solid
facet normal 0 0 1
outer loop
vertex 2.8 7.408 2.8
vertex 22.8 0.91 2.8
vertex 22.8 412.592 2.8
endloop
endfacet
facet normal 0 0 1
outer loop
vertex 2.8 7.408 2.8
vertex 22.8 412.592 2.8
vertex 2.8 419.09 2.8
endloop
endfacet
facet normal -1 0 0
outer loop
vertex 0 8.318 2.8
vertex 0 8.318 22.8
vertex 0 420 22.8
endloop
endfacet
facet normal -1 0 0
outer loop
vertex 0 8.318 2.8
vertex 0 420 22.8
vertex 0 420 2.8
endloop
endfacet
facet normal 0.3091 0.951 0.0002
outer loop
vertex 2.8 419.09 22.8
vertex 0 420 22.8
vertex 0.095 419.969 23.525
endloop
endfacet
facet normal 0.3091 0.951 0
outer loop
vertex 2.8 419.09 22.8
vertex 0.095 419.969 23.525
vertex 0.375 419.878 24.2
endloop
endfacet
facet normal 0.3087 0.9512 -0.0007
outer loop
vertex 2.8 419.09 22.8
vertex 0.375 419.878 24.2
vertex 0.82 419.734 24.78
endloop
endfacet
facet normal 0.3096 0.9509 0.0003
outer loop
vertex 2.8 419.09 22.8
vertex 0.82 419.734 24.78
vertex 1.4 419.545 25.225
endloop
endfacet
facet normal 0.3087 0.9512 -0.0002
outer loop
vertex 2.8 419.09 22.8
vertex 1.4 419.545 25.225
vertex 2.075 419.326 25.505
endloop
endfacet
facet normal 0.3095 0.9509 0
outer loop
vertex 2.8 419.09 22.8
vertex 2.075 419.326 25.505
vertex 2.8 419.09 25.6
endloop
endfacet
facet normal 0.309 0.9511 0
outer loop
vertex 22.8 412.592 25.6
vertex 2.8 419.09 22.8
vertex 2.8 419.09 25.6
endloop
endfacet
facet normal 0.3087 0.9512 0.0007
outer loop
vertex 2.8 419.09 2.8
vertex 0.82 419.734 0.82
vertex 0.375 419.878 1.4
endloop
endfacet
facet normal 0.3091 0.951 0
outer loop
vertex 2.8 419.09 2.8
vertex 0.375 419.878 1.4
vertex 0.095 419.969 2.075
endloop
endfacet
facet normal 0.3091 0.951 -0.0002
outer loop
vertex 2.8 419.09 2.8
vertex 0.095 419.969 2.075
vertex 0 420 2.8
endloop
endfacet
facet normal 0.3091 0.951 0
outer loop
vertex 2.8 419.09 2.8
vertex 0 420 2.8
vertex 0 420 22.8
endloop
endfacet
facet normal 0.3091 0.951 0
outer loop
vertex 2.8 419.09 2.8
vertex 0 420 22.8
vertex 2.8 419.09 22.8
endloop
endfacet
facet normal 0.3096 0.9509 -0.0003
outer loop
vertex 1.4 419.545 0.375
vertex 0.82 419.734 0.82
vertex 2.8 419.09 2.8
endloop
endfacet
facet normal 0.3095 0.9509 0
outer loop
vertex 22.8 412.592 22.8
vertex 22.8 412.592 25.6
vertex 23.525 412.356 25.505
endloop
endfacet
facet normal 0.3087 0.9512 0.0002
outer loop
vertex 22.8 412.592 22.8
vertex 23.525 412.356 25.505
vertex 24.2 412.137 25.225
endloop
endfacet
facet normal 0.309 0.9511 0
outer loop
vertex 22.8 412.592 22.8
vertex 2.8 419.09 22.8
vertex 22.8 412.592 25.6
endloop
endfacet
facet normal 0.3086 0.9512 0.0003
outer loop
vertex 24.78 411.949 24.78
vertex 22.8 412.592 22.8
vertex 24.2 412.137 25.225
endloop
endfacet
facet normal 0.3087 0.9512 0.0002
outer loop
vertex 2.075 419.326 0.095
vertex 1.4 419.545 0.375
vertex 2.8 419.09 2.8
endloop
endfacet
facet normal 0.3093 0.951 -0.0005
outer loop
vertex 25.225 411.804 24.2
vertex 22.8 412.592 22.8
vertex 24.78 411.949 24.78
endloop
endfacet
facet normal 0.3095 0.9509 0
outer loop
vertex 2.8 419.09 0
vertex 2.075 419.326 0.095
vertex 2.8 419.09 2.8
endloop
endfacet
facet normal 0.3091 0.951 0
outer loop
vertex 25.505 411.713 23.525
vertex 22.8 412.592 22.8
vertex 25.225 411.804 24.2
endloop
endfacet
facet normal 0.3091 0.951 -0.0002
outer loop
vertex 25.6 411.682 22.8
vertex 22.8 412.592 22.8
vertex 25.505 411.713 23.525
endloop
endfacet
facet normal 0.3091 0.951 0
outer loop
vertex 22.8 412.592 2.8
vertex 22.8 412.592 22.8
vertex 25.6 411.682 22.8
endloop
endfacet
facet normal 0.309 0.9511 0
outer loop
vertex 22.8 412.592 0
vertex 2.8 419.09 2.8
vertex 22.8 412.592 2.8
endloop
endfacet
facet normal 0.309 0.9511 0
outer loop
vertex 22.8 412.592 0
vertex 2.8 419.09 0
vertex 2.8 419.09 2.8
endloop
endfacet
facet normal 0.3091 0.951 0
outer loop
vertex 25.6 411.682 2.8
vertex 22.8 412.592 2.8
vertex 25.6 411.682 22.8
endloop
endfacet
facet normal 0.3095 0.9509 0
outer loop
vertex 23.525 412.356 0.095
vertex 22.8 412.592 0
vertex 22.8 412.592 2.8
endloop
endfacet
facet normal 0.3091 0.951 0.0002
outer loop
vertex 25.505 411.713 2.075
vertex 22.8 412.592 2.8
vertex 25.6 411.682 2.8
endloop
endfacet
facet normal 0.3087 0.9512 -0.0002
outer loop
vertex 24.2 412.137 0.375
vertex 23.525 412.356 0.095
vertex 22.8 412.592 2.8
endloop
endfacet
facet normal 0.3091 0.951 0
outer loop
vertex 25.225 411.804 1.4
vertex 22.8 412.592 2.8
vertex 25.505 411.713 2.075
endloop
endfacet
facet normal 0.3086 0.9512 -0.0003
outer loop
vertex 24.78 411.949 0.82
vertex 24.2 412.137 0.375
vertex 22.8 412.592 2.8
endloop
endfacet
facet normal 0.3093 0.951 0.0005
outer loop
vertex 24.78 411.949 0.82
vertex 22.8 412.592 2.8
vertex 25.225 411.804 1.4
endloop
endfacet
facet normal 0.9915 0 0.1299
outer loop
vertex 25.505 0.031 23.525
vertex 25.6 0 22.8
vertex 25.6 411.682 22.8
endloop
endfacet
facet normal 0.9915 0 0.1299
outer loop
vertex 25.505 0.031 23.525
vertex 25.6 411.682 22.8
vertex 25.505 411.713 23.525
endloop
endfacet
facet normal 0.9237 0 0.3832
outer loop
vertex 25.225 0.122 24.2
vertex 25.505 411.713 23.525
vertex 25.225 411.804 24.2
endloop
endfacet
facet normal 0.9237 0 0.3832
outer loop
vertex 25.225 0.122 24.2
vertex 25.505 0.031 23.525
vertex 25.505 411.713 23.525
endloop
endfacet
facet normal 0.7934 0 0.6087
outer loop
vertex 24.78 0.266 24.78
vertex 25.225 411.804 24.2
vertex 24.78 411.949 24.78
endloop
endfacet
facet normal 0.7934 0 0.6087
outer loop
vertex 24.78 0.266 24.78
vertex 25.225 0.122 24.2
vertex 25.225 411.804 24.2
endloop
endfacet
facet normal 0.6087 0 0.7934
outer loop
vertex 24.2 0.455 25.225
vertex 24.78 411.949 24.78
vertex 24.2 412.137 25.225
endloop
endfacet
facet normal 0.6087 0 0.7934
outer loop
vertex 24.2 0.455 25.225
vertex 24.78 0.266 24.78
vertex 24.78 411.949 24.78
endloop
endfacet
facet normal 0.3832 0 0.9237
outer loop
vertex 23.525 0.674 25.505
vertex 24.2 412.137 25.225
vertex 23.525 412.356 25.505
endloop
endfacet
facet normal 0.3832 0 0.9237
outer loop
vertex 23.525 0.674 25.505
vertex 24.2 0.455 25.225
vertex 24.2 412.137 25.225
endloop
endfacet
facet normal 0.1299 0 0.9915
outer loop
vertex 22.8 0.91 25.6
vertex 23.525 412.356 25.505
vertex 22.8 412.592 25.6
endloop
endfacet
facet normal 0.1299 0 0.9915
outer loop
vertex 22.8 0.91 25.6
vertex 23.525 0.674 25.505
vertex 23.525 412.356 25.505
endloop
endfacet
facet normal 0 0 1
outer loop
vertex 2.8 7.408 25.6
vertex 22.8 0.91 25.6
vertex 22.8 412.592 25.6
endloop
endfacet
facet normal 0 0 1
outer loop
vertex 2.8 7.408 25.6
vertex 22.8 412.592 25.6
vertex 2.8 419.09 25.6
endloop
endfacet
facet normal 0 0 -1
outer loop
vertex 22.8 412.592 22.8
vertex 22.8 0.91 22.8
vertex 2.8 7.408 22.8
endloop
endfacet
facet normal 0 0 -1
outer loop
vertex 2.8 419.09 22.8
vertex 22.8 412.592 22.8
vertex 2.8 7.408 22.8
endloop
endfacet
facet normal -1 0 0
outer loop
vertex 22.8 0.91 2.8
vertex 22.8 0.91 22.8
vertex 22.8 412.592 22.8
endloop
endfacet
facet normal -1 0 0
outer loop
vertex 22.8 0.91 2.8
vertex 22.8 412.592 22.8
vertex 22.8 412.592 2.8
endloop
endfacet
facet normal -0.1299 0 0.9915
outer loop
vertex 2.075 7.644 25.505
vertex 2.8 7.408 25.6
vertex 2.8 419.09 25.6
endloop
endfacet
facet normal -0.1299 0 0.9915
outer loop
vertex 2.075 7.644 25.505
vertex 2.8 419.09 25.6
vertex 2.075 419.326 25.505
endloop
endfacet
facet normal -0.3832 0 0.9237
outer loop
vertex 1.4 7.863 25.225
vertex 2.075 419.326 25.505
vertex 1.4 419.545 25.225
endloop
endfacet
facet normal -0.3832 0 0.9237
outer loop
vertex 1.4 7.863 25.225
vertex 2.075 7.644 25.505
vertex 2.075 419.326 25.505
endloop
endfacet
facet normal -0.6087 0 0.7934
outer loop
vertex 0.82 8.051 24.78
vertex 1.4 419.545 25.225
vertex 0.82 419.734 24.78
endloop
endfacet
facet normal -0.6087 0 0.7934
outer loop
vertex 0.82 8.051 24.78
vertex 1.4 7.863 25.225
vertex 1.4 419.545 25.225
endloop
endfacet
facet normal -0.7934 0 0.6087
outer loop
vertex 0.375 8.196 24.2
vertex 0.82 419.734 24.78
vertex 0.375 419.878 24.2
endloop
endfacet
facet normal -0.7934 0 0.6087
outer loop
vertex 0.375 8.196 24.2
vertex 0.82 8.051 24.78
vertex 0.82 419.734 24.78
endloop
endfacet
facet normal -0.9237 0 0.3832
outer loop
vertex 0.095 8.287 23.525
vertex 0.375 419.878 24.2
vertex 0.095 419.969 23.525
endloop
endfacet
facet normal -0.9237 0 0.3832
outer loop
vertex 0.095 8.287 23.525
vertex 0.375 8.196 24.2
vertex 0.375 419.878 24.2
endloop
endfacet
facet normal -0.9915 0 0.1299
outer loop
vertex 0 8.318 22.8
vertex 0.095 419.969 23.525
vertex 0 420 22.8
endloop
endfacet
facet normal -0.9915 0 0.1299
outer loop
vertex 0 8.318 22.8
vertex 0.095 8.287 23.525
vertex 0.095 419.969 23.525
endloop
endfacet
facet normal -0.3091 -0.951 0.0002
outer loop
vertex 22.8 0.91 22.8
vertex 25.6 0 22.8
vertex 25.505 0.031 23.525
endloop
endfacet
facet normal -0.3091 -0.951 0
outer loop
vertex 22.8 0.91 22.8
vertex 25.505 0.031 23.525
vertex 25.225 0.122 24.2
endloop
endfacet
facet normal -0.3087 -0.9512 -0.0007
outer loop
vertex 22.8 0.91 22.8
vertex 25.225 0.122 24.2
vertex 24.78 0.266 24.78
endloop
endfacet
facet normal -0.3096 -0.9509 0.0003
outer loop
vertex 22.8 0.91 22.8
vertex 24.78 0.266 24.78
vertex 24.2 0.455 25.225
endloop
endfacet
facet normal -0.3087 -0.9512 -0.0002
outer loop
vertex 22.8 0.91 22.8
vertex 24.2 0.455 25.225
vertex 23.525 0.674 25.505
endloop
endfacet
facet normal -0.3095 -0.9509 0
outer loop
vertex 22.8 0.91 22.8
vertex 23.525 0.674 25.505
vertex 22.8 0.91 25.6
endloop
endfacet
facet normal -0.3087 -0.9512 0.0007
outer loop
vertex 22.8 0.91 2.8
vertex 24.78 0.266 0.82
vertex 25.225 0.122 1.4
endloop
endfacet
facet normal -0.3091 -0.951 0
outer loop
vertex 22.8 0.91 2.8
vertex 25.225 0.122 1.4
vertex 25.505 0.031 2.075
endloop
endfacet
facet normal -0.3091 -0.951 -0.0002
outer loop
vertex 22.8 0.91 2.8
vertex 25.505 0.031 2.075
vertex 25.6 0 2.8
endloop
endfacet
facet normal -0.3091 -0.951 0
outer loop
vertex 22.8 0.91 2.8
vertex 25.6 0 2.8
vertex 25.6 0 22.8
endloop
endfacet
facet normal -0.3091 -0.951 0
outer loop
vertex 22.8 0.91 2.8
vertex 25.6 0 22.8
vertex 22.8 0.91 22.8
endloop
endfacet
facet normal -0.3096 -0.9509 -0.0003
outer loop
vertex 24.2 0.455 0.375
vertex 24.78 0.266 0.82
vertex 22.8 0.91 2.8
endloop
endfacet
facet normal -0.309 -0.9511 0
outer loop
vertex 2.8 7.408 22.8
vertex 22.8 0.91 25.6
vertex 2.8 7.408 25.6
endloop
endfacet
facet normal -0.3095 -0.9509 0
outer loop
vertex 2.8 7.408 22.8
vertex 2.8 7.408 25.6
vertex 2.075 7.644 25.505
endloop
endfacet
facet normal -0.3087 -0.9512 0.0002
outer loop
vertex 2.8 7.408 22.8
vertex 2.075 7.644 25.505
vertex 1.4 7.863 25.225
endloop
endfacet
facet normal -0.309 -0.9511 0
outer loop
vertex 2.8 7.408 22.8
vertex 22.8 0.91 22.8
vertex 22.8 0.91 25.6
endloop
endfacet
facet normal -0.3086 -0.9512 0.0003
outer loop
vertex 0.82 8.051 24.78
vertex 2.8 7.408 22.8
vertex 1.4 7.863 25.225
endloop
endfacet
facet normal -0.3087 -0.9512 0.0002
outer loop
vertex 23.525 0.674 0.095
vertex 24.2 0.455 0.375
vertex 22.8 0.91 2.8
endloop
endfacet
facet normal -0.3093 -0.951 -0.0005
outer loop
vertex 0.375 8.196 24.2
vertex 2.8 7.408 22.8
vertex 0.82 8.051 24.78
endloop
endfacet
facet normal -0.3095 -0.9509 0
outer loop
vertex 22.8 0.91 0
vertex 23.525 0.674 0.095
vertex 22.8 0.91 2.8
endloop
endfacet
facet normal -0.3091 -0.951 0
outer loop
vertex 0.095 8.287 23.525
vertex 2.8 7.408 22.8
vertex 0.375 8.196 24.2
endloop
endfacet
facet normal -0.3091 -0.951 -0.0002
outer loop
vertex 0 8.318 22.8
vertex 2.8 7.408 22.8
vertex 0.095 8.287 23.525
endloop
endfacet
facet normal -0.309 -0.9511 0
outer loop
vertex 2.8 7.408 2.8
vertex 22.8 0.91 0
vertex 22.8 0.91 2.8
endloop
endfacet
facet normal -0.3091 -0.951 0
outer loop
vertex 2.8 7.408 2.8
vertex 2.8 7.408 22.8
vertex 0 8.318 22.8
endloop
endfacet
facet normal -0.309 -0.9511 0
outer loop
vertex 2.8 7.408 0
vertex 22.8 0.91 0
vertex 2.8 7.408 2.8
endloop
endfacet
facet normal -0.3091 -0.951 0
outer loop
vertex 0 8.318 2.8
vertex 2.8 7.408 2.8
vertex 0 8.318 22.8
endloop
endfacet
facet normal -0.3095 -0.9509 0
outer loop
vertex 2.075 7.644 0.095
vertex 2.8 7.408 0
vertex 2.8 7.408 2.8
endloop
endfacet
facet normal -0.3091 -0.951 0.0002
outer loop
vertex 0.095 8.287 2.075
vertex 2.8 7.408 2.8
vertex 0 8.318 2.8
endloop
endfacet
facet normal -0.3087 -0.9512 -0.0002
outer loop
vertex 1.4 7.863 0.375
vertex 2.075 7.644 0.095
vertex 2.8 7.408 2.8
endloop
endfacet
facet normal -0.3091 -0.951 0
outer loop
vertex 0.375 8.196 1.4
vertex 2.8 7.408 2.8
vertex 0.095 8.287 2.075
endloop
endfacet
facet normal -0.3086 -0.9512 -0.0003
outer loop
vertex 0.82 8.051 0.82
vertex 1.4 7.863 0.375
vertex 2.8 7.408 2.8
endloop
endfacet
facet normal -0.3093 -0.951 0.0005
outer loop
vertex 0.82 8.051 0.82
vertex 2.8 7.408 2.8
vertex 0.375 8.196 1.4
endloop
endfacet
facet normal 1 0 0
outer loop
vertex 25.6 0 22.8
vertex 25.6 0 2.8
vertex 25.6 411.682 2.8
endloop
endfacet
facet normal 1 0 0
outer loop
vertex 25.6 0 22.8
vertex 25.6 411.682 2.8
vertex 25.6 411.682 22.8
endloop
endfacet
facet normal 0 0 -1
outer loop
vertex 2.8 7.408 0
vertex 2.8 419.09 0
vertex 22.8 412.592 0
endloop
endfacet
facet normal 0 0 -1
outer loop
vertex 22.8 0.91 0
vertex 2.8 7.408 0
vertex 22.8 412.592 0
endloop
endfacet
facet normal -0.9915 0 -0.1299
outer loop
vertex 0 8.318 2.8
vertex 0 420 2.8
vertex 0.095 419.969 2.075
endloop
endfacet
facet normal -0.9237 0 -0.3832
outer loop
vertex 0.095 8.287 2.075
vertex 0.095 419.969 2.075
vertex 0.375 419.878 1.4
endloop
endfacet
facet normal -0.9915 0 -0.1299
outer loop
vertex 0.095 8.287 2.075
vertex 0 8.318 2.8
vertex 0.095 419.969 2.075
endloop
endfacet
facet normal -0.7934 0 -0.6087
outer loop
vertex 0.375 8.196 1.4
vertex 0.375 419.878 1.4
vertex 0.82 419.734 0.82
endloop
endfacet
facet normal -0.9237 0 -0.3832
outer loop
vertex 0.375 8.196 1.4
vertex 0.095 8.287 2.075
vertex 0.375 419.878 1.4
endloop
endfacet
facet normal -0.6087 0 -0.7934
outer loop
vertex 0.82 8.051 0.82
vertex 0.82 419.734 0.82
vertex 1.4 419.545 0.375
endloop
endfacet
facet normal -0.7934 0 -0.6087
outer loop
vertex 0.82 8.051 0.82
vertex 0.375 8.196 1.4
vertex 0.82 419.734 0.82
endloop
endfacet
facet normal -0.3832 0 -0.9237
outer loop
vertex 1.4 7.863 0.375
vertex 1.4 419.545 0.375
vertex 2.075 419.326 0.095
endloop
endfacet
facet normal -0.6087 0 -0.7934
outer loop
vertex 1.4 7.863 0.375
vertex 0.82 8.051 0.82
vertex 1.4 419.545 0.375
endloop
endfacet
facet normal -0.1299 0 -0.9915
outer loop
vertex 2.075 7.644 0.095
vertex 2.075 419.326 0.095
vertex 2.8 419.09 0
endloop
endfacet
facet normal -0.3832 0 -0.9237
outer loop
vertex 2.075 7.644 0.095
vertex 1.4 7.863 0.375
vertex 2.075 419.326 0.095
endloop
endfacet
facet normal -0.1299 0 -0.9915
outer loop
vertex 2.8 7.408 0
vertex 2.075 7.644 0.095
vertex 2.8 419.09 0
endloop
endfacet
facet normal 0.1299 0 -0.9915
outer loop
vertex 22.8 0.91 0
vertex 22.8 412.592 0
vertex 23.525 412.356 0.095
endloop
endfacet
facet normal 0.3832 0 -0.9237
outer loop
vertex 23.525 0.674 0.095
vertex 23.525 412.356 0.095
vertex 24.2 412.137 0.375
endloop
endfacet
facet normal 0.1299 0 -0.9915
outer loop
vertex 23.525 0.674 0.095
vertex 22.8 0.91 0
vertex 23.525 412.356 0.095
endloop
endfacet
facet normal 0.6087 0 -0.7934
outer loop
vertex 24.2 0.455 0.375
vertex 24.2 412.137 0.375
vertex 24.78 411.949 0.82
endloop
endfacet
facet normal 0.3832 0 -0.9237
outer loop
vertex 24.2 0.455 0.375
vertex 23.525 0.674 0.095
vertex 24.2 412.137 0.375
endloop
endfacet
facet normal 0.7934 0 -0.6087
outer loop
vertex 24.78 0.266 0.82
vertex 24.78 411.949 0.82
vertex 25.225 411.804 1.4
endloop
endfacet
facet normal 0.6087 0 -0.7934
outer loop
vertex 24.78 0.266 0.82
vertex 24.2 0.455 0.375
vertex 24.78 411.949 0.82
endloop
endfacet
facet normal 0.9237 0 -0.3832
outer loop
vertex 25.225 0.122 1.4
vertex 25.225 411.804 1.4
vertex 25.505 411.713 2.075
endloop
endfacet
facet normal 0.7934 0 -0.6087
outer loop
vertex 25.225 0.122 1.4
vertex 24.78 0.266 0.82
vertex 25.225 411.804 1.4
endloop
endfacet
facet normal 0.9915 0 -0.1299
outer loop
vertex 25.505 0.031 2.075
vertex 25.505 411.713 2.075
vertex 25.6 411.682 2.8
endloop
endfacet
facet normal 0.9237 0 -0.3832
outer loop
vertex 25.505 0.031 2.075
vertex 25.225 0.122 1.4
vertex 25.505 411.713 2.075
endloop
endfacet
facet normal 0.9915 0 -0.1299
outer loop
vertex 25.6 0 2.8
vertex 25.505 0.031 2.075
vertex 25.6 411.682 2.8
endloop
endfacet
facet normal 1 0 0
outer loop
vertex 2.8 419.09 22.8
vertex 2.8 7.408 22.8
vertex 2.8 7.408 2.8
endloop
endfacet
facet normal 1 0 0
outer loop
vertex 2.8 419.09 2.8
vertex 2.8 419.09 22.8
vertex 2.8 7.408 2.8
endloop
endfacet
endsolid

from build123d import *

# Parameters (mm, degrees)
BOSS_EXTRUDE1_DEPTH     = 420
SKETCH3_W               = 20
SKETCH3_H               = 20
CUT_EXTRUDE1_DEPTH      = 1040.5
CUT_EXTRUDE3_DEPTH      = 422.396725189
CUT_EXTRUDE3_DEPTH_BACK = 422.396725189
CUT_EXTRUDE4_DEPTH      = 422.396725189
CUT_EXTRUDE4_DEPTH_BACK = 422.396725189


with BuildPart() as part:
    # Sketch1 → Boss-Extrude1 (new body)
    with BuildSketch(Plane(origin=(0, 0, 0), x_dir=(1, 0, 0), z_dir=(0, 1, 0))):
        with BuildLine():
            Line((2.8, 0), (22.8, 0))
            ThreePointArc((22.8, 0), (24.779898987, -0.820101013), (25.6, -2.8))
            Line((25.6, -2.8), (25.6, -22.8))
            ThreePointArc((25.6, -22.8), (24.779898987, -24.779898987), (22.8, -25.6))
            Line((22.8, -25.6), (2.8, -25.6))
            ThreePointArc((2.8, -25.6), (0.820101013, -24.779898987), (0, -22.8))
            Line((0, -22.8), (0, -2.8))
            ThreePointArc((0, -2.8), (0.820101013, -0.820101013), (2.8, 0))
        make_face()
    extrude(amount=BOSS_EXTRUDE1_DEPTH)

    # Sketch3 → Cut-Extrude1 (cut)
    with BuildSketch(Plane(origin=(0, 0, 0), x_dir=(-1, 0, 0), z_dir=(0, -1, 0))):
        with Locations((-12.8, -12.8)):
            Rectangle(SKETCH3_W, SKETCH3_H)
    extrude(amount=-CUT_EXTRUDE1_DEPTH, mode=Mode.SUBTRACT)

    # Sketch5 → Cut-Extrude3 (cut, two sides: drawn at the far end of the back side and taken through both)
    with BuildSketch(Plane.XY.offset(22.8).offset(-CUT_EXTRUDE3_DEPTH_BACK)):
        Polygon((835.480673532, -263.146182429), (25.6, 0), (0, 8.317944224), (-809.880673532, 271.464126652), (-1336.173038389, -1348.297220411), (309.188308674, -1882.907529492), align=None)
    extrude(amount=CUT_EXTRUDE3_DEPTH + CUT_EXTRUDE3_DEPTH_BACK, mode=Mode.SUBTRACT)

    # Sketch4 → Cut-Extrude4 (cut, two sides: drawn at the far end of the back side and taken through both)
    with BuildSketch(Plane.XY.offset(22.8).offset(-CUT_EXTRUDE4_DEPTH_BACK)):
        Polygon((-809.880673532, 683.146182429), (0, 420), (25.6, 411.682055776), (835.480673532, 148.535873348), (1361.773038389, 1768.297220411), (-283.588308674, 2302.907529492), align=None)
    extrude(amount=CUT_EXTRUDE4_DEPTH + CUT_EXTRUDE4_DEPTH_BACK, mode=Mode.SUBTRACT)


solid = part.part
